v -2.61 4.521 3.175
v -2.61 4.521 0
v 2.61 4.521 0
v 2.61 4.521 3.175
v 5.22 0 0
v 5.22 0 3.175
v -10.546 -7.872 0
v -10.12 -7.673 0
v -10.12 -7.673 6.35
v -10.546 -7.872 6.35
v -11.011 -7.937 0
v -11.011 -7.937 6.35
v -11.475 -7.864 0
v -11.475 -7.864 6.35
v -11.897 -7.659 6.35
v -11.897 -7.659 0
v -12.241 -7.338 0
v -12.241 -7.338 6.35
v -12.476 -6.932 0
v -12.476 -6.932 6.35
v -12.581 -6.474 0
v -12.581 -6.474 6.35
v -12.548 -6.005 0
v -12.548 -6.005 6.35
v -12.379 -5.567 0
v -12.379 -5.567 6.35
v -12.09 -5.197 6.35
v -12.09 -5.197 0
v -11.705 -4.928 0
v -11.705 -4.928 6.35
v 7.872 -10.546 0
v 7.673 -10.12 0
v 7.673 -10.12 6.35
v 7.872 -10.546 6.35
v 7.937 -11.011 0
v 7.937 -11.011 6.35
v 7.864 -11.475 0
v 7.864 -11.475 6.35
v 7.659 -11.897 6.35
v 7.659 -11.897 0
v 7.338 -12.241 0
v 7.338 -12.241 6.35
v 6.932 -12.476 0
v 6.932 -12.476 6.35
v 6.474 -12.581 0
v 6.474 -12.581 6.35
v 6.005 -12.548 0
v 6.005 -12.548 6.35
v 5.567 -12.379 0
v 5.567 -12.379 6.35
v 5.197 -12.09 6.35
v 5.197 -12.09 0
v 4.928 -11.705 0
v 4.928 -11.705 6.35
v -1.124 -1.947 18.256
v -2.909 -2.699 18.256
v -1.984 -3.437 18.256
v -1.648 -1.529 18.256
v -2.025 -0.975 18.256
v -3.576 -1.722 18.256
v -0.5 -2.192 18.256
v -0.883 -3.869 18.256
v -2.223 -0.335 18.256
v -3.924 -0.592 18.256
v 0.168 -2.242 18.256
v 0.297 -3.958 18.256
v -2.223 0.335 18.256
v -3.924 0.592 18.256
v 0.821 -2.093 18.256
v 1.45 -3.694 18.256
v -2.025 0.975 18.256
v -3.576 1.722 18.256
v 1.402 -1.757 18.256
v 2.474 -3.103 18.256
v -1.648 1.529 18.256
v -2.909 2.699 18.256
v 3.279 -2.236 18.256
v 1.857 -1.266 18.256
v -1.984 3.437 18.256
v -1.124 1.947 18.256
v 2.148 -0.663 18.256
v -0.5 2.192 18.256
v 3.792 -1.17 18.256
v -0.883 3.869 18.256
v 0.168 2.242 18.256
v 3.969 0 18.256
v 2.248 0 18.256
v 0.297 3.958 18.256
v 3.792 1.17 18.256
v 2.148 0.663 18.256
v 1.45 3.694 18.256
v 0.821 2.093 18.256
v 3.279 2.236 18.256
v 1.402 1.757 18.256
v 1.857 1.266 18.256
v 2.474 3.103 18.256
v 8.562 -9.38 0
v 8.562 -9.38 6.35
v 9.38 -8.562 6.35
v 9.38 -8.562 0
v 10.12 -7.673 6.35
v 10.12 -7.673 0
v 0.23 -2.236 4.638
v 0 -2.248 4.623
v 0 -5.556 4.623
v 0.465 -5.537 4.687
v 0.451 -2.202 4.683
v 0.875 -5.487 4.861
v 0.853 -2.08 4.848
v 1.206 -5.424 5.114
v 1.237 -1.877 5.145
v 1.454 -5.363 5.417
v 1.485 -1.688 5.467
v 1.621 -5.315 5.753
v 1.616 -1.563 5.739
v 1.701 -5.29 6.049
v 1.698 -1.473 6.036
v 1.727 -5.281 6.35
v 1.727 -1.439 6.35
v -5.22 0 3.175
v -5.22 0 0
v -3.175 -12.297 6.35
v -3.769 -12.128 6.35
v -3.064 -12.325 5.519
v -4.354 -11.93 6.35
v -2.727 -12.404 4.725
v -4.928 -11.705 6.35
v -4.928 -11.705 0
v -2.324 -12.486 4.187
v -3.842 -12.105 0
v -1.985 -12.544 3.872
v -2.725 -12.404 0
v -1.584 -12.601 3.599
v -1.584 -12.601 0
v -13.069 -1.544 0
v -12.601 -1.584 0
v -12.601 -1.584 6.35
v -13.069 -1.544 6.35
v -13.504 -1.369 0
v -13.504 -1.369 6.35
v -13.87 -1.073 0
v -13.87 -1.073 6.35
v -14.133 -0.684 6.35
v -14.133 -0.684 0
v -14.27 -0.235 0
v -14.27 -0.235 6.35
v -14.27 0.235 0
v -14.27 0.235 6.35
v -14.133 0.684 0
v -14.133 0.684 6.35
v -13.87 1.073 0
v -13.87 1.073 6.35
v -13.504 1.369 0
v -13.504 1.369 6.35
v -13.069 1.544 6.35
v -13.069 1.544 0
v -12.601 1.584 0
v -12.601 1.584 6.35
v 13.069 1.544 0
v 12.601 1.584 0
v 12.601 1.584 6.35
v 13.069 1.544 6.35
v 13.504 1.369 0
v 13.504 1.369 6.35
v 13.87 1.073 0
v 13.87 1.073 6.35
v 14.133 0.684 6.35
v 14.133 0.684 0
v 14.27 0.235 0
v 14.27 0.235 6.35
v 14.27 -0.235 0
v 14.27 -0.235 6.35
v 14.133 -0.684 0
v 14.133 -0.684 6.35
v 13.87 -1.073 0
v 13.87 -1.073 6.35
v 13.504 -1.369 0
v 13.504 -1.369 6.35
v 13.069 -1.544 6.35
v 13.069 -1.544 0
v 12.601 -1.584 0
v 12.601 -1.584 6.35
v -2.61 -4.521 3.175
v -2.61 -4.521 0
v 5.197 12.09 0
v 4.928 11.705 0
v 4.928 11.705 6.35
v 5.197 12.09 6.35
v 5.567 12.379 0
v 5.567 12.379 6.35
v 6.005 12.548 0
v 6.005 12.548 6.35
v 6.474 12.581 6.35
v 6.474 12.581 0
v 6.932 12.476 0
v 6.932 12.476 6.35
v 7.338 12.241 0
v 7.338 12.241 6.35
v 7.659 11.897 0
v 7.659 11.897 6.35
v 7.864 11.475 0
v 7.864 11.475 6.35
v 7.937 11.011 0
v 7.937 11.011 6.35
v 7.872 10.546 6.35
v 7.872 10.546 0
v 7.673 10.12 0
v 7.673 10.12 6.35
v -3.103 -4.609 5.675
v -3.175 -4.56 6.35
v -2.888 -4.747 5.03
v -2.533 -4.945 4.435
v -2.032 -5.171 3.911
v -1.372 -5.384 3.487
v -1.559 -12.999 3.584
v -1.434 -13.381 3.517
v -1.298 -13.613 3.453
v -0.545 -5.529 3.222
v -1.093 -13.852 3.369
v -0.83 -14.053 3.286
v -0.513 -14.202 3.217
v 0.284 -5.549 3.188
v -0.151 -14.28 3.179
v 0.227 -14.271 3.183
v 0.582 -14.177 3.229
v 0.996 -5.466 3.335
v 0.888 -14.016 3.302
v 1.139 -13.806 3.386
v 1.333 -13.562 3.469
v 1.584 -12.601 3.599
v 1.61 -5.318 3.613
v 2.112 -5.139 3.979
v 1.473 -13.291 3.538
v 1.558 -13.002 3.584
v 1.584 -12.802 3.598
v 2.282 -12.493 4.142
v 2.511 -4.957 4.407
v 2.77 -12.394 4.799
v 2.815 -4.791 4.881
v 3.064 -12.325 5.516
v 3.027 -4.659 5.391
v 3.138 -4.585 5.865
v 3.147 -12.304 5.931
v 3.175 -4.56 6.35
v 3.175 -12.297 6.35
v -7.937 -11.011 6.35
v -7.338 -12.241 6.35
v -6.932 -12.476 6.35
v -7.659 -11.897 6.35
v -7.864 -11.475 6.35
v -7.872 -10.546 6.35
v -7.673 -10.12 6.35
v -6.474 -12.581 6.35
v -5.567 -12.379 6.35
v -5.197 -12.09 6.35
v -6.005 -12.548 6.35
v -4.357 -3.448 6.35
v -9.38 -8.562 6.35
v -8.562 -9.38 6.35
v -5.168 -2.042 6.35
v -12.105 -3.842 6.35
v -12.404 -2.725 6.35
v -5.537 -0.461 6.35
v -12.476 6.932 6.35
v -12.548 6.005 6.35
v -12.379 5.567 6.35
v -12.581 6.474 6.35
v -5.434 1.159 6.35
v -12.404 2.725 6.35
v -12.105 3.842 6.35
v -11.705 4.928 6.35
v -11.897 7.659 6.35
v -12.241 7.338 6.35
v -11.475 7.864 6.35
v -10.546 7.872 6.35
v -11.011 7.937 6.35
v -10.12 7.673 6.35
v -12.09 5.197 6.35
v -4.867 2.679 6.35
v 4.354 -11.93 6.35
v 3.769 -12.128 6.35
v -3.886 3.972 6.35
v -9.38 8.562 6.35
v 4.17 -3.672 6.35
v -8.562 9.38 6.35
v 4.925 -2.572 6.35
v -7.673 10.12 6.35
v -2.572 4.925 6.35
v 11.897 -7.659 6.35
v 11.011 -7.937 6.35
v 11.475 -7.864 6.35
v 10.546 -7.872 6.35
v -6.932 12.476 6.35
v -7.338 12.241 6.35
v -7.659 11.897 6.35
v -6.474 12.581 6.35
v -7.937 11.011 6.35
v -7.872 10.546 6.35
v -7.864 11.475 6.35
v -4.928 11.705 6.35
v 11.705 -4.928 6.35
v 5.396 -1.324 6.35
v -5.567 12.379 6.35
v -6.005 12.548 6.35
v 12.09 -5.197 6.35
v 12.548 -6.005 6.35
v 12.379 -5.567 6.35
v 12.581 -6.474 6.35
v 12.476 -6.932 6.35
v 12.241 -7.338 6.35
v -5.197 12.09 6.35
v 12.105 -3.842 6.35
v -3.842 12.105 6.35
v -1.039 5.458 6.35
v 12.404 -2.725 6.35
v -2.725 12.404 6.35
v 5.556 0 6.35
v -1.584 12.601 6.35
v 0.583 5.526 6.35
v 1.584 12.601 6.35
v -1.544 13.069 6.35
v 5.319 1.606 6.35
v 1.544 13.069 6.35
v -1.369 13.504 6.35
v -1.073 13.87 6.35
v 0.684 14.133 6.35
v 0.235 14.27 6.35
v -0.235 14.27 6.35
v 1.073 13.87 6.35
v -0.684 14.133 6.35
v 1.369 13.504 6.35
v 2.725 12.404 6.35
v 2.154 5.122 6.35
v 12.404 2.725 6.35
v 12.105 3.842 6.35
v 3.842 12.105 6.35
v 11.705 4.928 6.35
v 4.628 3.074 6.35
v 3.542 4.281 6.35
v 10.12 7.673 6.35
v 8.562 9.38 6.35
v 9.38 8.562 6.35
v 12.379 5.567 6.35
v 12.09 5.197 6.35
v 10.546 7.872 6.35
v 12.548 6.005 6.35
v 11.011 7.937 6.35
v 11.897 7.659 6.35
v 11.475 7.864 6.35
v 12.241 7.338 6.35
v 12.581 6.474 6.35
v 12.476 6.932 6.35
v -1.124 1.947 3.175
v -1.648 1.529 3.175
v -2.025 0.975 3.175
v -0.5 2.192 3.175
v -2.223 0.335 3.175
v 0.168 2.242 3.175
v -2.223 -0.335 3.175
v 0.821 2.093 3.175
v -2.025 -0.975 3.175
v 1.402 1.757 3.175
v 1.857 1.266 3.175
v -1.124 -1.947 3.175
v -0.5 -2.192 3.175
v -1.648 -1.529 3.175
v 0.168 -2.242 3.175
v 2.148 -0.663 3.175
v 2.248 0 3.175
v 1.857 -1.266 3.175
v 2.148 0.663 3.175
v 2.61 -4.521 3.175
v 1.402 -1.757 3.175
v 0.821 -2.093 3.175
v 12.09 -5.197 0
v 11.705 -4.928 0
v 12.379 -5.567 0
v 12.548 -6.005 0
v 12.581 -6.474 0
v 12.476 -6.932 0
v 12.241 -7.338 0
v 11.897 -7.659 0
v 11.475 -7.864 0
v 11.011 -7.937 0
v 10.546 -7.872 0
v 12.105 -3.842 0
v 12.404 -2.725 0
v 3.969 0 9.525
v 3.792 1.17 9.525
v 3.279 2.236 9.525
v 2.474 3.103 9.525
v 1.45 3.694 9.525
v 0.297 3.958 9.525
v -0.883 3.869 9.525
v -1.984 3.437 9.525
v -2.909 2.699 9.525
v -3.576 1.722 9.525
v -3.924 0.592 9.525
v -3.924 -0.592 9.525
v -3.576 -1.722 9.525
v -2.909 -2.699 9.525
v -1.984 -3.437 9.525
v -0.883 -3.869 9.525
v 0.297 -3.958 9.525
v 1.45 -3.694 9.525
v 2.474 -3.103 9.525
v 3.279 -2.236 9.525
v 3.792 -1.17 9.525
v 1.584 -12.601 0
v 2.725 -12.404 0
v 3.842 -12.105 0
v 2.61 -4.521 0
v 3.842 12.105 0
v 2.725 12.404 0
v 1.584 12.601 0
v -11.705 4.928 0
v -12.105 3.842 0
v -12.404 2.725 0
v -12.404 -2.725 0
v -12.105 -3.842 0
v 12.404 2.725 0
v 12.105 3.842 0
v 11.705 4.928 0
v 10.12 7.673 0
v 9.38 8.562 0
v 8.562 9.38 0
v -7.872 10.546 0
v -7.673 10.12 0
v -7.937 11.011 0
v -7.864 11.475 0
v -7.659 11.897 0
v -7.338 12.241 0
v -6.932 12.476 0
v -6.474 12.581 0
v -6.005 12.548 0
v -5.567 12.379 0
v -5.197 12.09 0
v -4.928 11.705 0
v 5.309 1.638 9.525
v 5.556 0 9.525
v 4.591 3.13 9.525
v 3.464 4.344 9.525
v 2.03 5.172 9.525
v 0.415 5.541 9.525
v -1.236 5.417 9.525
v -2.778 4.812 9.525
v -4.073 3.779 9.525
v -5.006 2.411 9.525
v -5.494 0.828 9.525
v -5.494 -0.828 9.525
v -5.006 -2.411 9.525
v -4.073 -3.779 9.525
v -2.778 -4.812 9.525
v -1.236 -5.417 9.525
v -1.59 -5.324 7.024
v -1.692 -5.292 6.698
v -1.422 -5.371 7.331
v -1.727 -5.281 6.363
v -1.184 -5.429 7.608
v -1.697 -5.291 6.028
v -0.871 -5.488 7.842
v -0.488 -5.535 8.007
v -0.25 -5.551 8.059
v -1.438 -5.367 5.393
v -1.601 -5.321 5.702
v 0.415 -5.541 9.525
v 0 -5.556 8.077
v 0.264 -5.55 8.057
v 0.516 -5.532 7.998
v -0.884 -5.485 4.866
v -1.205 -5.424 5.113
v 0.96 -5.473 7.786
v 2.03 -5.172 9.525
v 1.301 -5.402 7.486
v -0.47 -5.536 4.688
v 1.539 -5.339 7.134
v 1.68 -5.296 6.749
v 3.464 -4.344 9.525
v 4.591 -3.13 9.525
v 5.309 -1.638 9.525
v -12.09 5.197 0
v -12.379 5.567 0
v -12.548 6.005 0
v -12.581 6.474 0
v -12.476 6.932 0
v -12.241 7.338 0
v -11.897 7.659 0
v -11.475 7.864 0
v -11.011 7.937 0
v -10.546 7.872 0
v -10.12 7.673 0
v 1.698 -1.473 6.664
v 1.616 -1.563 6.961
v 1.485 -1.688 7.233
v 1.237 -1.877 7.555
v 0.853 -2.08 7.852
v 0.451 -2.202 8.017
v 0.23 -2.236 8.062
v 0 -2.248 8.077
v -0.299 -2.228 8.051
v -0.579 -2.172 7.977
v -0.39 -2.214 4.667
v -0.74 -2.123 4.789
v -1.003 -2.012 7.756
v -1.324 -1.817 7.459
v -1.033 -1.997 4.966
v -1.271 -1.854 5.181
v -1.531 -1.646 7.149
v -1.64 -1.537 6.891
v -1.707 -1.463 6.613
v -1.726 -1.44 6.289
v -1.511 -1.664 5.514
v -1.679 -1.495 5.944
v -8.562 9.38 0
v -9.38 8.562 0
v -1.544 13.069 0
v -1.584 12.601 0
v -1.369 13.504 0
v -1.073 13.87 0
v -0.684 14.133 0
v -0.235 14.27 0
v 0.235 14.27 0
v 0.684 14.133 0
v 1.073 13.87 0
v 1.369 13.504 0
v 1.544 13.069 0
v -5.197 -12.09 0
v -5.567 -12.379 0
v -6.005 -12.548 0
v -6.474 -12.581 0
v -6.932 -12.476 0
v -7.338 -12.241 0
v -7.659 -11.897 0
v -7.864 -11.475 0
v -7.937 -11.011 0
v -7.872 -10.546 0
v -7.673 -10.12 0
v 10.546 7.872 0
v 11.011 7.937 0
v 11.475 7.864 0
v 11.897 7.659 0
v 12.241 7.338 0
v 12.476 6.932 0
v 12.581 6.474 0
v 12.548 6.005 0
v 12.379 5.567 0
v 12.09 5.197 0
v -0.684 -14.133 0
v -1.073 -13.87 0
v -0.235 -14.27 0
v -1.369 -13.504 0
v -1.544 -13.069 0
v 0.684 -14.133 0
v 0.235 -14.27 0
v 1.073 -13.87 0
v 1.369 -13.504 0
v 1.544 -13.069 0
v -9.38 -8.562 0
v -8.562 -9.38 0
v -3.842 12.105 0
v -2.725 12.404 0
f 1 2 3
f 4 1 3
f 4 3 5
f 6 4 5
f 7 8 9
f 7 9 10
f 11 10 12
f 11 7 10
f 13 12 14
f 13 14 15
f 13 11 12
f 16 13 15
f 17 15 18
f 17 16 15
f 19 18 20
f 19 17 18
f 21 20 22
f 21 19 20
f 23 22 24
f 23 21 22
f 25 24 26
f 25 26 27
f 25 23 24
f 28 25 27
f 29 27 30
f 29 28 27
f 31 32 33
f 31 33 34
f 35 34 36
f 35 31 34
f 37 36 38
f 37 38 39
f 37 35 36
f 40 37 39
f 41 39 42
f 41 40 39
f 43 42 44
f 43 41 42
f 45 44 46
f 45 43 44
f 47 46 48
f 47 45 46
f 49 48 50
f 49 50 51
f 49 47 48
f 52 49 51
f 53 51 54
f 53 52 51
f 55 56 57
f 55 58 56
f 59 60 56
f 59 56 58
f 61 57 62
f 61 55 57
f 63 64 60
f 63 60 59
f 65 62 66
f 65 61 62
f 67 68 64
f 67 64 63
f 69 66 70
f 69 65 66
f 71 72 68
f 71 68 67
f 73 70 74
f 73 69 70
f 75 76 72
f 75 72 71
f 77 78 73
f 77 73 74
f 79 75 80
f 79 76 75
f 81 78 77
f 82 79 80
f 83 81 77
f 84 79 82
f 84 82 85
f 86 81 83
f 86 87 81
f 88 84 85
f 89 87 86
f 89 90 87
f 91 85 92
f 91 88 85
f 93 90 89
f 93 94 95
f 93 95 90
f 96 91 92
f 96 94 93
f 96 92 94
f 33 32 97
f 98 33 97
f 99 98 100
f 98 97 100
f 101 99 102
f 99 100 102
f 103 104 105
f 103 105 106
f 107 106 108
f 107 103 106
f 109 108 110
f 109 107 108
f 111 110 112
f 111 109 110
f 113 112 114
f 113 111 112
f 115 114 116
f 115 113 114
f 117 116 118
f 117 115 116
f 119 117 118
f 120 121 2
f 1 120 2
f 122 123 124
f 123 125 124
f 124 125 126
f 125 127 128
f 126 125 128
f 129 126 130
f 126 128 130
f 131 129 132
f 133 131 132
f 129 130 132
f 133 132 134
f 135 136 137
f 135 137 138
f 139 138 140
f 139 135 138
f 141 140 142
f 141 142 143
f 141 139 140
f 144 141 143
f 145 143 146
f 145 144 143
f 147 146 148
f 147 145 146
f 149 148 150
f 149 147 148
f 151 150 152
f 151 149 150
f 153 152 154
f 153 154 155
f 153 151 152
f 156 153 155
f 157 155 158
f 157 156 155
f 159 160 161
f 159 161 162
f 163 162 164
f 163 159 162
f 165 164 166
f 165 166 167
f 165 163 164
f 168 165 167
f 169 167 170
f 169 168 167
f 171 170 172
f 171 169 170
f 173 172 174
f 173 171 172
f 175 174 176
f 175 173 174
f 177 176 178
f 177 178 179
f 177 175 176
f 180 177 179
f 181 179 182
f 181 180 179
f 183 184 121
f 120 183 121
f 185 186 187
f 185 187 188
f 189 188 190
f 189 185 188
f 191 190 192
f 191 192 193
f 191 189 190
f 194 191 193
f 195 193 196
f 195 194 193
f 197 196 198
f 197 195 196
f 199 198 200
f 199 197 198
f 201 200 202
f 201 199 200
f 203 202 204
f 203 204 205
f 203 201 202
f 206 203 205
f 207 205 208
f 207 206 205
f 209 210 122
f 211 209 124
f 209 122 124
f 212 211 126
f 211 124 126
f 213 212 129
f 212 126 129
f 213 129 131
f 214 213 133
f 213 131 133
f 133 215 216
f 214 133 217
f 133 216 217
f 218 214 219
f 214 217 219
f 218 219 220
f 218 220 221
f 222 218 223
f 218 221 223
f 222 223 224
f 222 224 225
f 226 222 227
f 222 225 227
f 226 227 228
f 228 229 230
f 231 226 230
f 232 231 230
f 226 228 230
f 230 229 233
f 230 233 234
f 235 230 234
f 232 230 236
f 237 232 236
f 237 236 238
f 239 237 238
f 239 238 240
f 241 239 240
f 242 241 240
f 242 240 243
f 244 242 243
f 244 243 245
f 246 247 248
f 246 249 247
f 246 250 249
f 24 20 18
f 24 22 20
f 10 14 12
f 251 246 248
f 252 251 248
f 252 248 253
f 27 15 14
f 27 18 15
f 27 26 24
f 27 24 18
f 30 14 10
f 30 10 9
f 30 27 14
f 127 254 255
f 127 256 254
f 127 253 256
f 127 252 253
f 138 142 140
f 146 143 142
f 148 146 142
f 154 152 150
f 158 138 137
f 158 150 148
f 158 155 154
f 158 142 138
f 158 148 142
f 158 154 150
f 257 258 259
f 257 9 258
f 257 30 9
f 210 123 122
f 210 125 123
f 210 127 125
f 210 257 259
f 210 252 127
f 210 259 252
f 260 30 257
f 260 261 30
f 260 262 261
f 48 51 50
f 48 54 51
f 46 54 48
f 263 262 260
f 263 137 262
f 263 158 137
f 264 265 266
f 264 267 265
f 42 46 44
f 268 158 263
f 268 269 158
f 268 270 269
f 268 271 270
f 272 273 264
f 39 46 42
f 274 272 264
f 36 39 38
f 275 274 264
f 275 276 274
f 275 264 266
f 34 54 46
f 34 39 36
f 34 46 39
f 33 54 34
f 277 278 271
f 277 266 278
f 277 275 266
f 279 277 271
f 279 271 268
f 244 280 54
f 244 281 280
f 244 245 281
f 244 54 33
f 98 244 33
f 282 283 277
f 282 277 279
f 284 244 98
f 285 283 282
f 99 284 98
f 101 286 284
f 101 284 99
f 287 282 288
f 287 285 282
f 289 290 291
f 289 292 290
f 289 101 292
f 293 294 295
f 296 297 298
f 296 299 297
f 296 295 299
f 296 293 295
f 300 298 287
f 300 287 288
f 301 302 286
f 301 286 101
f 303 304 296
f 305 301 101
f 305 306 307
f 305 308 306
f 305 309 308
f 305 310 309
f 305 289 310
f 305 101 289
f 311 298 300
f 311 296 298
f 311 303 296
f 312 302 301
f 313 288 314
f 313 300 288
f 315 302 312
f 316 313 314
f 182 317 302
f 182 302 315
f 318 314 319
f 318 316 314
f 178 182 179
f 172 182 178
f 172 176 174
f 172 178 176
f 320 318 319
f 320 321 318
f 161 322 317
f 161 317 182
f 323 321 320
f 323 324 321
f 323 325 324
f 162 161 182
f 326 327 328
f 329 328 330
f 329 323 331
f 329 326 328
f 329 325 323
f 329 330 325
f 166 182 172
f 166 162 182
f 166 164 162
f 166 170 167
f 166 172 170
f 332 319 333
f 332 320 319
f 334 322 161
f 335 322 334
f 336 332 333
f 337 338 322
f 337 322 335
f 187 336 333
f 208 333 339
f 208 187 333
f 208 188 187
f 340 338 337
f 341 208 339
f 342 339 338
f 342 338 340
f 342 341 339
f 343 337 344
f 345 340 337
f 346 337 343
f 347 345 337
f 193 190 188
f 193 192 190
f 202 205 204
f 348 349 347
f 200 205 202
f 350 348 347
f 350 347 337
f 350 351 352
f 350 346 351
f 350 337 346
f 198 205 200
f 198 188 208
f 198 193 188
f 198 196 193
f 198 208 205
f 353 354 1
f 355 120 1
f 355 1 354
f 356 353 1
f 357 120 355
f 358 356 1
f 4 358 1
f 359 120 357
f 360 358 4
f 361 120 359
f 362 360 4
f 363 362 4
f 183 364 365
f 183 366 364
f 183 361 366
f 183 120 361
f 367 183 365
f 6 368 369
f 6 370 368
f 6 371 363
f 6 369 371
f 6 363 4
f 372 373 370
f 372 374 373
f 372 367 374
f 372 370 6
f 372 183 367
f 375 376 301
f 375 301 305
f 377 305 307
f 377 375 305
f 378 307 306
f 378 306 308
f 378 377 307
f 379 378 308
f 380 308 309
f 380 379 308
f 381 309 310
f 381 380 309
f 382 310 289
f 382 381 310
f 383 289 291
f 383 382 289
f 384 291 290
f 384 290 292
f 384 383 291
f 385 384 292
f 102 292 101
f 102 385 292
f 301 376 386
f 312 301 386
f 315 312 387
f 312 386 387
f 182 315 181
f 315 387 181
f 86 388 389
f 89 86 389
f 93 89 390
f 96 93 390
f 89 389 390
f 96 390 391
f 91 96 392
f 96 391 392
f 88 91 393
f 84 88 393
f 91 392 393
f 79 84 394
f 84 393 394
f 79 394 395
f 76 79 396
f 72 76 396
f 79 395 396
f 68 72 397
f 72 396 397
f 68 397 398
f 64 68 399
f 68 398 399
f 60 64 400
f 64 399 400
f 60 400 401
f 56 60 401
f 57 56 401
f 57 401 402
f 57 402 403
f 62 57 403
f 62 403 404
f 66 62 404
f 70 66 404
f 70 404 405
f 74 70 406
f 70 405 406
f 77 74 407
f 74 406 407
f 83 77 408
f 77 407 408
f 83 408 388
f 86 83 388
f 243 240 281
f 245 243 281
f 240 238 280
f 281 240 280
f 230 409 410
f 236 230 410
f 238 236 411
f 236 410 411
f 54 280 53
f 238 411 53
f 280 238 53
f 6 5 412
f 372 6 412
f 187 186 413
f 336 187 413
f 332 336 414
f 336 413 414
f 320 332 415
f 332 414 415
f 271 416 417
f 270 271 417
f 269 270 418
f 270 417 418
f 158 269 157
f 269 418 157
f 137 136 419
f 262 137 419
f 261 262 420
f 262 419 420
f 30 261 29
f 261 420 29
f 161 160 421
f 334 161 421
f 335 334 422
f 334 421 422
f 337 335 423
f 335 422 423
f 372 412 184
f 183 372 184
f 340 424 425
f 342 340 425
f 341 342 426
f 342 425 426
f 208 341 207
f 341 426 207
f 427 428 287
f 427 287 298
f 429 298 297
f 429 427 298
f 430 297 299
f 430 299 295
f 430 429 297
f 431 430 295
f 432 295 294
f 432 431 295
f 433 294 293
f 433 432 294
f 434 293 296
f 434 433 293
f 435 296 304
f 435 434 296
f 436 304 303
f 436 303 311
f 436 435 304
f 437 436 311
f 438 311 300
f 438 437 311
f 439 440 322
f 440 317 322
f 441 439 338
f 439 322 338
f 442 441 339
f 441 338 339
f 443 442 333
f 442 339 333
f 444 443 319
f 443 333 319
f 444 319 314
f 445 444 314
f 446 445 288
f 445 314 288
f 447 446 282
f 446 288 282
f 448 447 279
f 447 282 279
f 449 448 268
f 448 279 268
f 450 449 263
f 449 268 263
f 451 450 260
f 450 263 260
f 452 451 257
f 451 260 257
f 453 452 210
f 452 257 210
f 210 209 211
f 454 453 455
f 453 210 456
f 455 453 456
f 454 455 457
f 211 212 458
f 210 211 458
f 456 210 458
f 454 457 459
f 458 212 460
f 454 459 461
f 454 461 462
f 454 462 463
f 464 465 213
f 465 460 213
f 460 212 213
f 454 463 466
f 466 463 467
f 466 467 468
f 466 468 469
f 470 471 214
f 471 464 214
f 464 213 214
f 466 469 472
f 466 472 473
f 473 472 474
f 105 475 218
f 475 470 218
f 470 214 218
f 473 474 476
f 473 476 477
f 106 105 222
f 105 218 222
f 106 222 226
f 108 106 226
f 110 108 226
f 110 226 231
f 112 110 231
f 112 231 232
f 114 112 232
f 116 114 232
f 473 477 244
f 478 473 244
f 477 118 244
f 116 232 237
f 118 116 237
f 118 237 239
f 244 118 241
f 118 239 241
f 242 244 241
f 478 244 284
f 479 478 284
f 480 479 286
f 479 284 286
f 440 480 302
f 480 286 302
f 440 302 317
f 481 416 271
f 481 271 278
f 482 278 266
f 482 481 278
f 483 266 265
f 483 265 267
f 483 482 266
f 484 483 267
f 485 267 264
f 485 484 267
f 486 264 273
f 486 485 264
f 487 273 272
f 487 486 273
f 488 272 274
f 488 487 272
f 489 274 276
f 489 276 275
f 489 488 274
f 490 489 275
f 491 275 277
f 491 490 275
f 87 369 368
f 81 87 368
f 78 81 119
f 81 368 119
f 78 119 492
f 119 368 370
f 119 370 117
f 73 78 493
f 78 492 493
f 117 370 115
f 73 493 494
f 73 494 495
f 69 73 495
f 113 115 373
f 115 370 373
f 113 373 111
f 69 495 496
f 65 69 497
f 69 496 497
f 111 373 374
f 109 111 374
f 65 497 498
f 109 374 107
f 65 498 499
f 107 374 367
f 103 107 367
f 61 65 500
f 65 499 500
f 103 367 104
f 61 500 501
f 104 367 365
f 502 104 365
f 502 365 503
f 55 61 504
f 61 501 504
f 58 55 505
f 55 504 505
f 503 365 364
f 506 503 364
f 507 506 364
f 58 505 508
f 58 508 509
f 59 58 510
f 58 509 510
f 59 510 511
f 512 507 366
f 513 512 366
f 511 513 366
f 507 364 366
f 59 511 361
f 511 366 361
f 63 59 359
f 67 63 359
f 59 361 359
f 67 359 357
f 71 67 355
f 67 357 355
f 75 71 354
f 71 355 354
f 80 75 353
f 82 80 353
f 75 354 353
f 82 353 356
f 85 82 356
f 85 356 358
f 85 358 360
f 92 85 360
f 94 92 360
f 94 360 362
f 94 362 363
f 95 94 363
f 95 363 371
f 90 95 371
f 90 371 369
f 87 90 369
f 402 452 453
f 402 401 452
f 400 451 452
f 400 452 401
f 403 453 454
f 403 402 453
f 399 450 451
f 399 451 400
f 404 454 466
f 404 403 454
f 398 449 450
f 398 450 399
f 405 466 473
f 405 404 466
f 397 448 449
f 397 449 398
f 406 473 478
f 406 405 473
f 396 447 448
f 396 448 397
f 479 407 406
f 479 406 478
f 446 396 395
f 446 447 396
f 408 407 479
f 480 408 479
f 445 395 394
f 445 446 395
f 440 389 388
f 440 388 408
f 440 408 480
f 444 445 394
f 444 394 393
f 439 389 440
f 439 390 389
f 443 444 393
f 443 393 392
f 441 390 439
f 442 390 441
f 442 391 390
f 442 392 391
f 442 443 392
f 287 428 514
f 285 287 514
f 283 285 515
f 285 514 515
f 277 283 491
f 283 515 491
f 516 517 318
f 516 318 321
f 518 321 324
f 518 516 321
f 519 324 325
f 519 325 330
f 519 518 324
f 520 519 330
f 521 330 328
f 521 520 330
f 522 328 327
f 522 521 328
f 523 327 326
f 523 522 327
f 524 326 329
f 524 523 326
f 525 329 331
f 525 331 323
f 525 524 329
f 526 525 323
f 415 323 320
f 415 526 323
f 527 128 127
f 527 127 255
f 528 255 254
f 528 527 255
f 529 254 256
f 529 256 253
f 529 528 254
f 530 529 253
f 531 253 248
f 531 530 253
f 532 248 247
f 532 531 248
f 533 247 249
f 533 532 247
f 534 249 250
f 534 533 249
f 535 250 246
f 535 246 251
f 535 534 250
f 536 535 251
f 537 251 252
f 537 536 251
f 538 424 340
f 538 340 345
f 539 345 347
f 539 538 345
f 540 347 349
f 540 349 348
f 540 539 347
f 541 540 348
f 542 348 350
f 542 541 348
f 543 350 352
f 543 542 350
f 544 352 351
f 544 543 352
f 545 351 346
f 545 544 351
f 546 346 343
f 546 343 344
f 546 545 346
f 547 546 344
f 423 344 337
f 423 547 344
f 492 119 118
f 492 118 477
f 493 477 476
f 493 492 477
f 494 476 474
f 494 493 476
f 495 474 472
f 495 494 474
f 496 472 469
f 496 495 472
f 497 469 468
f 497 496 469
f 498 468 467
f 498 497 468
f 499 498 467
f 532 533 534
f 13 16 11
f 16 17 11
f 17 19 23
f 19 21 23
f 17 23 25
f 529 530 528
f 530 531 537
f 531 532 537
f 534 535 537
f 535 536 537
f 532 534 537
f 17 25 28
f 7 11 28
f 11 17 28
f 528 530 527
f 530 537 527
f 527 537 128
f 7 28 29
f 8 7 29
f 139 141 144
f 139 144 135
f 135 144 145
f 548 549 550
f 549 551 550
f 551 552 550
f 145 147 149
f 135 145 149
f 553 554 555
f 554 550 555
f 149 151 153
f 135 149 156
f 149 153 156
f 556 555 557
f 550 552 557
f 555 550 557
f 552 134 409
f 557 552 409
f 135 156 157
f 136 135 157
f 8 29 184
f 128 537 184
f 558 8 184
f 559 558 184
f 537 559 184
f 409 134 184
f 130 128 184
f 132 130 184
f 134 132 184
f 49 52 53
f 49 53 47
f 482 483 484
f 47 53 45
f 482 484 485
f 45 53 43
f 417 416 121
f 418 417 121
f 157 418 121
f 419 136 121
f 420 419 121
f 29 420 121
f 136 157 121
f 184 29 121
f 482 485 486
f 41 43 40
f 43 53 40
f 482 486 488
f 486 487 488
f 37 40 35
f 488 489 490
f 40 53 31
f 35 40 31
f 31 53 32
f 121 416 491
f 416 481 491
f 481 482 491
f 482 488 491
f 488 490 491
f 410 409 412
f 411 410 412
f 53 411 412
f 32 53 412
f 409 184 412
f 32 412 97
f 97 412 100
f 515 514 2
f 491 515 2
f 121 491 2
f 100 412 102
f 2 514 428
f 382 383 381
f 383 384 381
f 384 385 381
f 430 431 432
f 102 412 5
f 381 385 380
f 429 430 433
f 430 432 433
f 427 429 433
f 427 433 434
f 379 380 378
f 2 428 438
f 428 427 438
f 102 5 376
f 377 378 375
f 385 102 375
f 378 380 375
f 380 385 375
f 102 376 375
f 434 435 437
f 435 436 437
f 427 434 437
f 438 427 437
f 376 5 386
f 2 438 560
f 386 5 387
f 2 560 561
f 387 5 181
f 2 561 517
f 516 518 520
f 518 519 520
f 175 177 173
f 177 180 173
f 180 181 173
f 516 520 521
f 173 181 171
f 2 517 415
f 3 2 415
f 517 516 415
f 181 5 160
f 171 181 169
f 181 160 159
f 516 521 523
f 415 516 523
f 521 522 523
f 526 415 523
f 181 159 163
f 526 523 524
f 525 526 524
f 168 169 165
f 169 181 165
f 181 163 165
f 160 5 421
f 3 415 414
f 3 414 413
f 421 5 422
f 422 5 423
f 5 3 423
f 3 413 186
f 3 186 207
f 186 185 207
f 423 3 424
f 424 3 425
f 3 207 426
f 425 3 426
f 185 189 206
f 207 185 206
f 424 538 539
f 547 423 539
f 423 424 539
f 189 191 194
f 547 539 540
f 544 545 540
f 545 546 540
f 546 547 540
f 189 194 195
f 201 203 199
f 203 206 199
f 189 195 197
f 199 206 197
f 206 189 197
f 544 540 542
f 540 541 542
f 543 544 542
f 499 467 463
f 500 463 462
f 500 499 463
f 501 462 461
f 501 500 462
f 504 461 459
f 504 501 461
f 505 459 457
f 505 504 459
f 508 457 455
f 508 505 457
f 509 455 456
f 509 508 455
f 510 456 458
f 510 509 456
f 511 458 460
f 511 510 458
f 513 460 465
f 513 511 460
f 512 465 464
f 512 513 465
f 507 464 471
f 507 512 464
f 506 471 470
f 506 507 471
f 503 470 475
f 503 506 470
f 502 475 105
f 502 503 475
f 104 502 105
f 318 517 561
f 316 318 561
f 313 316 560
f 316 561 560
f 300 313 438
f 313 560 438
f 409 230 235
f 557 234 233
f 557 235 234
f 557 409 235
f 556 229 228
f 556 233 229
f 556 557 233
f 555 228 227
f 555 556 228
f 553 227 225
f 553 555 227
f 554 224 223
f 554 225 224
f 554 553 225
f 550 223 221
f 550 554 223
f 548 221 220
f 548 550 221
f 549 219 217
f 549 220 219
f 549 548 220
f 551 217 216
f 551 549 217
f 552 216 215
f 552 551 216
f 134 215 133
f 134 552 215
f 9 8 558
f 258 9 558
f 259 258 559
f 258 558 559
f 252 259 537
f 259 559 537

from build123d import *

# Parameters (mm, degrees)
F0_R           = 12.7
F1_DEPTH       = 6.35
F3_DEPTH       = 3.175
F4_R           = 5.55625
F5_DEPTH       = 3.175
F6_R           = 3.96875
F7_DEPTH       = 8.73125
F8_R           = 2.2479
F9_DEPTH       = 15.08125
F11_DEPTH      = 6.35
F12_COUNT      = 12
F12_ANGLE      = 330
F14_END_RADIUS = 5.55625
F14_REACH      = 18.1506366107
F17_END_RADIUS = 5.55625
F17_REACH      = 35.6755158286


with BuildPart() as f1:
    # F0 (on Top) → F1 (new body)
    with BuildSketch(Plane.XY):
        Circle(F0_R)
    extrude(amount=F1_DEPTH)

    # F2 (on face) → F3 (cut)
    with BuildSketch(Plane(origin=(0, 0, 0), x_dir=(1, 0, 0), z_dir=(0, 0, -1))):
        Polygon((2.6100007461, 4.5206539), (-2.6100007461, 4.5206539), (-5.2200014922, 0), (-2.6100007461, -4.5206539), (2.6100007461, -4.5206539), (5.2200014922, 0), align=None)
    extrude(amount=-F3_DEPTH, mode=Mode.SUBTRACT)

    # F4 (on face) → F5 (join)
    with BuildSketch(Plane.XY.offset(6.35)):
        Circle(F4_R)
    extrude(amount=F5_DEPTH)

    # F6 (on face) → F7 (join)
    with BuildSketch(Plane.XY.offset(9.525)):
        Circle(F6_R)
    extrude(amount=F7_DEPTH)

    # F8 (on face) → F9 (cut, through all)
    with BuildSketch(Plane(origin=(0, 0, 3.175), x_dir=(1, 0, 0), z_dir=(0, 0, -1))):
        Circle(F8_R)
    extrude(amount=-F9_DEPTH, mode=Mode.SUBTRACT)

    # F10 (on face) → F11 (join, through all)
    with BuildSketch(Plane(origin=(0, 0, 0), x_dir=(1, 0, 0), z_dir=(0, 0, -1))):
        with BuildLine():
            ThreePointArc((-1.5843963802, 12.60078125), (0, 12.7), (1.5843963802, 12.60078125))
            ThreePointArc((1.5843963802, 12.60078125), (0, 14.2875), (-1.5843963802, 12.60078125))
        make_face()
    f11 = extrude(amount=-F11_DEPTH)

    # F12: F11 ×12 about axis
    f12_axis = Axis((0, 0, 0), (0, 0, -1))
    for i in range(1, F12_COUNT):
        add(f11.rotate(f12_axis, i * F12_ANGLE / (F12_COUNT - 1)))

    f14_end = (Plane(origin=(0, 0, 7.9375), x_dir=(-1, 0, 0), z_dir=(0, 0, -1)) * Cylinder(F14_END_RADIUS, 124.9884067655, mode=Mode.PRIVATE)).faces().sort_by_distance((-5.55625, 0, 7.9375))[0]
    # F13 (on Front) → F14 (cut, up to the whole of a round face its end follows)
    with BuildSketch(Plane.XZ):
        with BuildLine():
            ThreePointArc((0, 8.0772), (-1.7272, 6.35), (0, 4.6228))
            Line((0, 4.6228), (0, 8.0772))
        make_face()
        with BuildLine():
            Line((0, 8.0772), (0, 4.6228))
            ThreePointArc((0, 4.6228), (1.2213148325, 5.1286851675), (1.7272, 6.35))
            ThreePointArc((1.7272, 6.35), (1.2213148325, 7.5713148325), (0, 8.0772))
        make_face()
    f14_long = extrude(amount=F14_REACH, mode=Mode.PRIVATE)
    add(split(f14_long, bisect_by=f14_end, keep=Keep.BOTTOM, mode=Mode.PRIVATE), mode=Mode.SUBTRACT)

    f17_end = (Plane(origin=(0, 0, 7.9375), x_dir=(-1, 0, 0), z_dir=(0, 0, -1)) * Cylinder(F17_END_RADIUS, 160.0381652835, mode=Mode.PRIVATE)).faces().sort_by_distance((-5.55625, 0, 7.9375))[0]
    # F16 (on offset) → F17 (cut, up to the whole of a round face its end follows)
    with BuildSketch(Plane.XZ.offset(14.2875)):
        with BuildLine():
            Line((3.175, 6.35), (-3.175, 6.35))
            ThreePointArc((-3.175, 6.35), (0, 3.175), (3.175, 6.35))
        make_face()
    f17_long = extrude(amount=-F17_REACH, mode=Mode.PRIVATE)
    add(split(f17_long, bisect_by=f17_end, keep=Keep.ALL, mode=Mode.PRIVATE).solids().sort_by_distance((0, -14.2875, 5.0024881485))[0], mode=Mode.SUBTRACT)


solid = f1.part
